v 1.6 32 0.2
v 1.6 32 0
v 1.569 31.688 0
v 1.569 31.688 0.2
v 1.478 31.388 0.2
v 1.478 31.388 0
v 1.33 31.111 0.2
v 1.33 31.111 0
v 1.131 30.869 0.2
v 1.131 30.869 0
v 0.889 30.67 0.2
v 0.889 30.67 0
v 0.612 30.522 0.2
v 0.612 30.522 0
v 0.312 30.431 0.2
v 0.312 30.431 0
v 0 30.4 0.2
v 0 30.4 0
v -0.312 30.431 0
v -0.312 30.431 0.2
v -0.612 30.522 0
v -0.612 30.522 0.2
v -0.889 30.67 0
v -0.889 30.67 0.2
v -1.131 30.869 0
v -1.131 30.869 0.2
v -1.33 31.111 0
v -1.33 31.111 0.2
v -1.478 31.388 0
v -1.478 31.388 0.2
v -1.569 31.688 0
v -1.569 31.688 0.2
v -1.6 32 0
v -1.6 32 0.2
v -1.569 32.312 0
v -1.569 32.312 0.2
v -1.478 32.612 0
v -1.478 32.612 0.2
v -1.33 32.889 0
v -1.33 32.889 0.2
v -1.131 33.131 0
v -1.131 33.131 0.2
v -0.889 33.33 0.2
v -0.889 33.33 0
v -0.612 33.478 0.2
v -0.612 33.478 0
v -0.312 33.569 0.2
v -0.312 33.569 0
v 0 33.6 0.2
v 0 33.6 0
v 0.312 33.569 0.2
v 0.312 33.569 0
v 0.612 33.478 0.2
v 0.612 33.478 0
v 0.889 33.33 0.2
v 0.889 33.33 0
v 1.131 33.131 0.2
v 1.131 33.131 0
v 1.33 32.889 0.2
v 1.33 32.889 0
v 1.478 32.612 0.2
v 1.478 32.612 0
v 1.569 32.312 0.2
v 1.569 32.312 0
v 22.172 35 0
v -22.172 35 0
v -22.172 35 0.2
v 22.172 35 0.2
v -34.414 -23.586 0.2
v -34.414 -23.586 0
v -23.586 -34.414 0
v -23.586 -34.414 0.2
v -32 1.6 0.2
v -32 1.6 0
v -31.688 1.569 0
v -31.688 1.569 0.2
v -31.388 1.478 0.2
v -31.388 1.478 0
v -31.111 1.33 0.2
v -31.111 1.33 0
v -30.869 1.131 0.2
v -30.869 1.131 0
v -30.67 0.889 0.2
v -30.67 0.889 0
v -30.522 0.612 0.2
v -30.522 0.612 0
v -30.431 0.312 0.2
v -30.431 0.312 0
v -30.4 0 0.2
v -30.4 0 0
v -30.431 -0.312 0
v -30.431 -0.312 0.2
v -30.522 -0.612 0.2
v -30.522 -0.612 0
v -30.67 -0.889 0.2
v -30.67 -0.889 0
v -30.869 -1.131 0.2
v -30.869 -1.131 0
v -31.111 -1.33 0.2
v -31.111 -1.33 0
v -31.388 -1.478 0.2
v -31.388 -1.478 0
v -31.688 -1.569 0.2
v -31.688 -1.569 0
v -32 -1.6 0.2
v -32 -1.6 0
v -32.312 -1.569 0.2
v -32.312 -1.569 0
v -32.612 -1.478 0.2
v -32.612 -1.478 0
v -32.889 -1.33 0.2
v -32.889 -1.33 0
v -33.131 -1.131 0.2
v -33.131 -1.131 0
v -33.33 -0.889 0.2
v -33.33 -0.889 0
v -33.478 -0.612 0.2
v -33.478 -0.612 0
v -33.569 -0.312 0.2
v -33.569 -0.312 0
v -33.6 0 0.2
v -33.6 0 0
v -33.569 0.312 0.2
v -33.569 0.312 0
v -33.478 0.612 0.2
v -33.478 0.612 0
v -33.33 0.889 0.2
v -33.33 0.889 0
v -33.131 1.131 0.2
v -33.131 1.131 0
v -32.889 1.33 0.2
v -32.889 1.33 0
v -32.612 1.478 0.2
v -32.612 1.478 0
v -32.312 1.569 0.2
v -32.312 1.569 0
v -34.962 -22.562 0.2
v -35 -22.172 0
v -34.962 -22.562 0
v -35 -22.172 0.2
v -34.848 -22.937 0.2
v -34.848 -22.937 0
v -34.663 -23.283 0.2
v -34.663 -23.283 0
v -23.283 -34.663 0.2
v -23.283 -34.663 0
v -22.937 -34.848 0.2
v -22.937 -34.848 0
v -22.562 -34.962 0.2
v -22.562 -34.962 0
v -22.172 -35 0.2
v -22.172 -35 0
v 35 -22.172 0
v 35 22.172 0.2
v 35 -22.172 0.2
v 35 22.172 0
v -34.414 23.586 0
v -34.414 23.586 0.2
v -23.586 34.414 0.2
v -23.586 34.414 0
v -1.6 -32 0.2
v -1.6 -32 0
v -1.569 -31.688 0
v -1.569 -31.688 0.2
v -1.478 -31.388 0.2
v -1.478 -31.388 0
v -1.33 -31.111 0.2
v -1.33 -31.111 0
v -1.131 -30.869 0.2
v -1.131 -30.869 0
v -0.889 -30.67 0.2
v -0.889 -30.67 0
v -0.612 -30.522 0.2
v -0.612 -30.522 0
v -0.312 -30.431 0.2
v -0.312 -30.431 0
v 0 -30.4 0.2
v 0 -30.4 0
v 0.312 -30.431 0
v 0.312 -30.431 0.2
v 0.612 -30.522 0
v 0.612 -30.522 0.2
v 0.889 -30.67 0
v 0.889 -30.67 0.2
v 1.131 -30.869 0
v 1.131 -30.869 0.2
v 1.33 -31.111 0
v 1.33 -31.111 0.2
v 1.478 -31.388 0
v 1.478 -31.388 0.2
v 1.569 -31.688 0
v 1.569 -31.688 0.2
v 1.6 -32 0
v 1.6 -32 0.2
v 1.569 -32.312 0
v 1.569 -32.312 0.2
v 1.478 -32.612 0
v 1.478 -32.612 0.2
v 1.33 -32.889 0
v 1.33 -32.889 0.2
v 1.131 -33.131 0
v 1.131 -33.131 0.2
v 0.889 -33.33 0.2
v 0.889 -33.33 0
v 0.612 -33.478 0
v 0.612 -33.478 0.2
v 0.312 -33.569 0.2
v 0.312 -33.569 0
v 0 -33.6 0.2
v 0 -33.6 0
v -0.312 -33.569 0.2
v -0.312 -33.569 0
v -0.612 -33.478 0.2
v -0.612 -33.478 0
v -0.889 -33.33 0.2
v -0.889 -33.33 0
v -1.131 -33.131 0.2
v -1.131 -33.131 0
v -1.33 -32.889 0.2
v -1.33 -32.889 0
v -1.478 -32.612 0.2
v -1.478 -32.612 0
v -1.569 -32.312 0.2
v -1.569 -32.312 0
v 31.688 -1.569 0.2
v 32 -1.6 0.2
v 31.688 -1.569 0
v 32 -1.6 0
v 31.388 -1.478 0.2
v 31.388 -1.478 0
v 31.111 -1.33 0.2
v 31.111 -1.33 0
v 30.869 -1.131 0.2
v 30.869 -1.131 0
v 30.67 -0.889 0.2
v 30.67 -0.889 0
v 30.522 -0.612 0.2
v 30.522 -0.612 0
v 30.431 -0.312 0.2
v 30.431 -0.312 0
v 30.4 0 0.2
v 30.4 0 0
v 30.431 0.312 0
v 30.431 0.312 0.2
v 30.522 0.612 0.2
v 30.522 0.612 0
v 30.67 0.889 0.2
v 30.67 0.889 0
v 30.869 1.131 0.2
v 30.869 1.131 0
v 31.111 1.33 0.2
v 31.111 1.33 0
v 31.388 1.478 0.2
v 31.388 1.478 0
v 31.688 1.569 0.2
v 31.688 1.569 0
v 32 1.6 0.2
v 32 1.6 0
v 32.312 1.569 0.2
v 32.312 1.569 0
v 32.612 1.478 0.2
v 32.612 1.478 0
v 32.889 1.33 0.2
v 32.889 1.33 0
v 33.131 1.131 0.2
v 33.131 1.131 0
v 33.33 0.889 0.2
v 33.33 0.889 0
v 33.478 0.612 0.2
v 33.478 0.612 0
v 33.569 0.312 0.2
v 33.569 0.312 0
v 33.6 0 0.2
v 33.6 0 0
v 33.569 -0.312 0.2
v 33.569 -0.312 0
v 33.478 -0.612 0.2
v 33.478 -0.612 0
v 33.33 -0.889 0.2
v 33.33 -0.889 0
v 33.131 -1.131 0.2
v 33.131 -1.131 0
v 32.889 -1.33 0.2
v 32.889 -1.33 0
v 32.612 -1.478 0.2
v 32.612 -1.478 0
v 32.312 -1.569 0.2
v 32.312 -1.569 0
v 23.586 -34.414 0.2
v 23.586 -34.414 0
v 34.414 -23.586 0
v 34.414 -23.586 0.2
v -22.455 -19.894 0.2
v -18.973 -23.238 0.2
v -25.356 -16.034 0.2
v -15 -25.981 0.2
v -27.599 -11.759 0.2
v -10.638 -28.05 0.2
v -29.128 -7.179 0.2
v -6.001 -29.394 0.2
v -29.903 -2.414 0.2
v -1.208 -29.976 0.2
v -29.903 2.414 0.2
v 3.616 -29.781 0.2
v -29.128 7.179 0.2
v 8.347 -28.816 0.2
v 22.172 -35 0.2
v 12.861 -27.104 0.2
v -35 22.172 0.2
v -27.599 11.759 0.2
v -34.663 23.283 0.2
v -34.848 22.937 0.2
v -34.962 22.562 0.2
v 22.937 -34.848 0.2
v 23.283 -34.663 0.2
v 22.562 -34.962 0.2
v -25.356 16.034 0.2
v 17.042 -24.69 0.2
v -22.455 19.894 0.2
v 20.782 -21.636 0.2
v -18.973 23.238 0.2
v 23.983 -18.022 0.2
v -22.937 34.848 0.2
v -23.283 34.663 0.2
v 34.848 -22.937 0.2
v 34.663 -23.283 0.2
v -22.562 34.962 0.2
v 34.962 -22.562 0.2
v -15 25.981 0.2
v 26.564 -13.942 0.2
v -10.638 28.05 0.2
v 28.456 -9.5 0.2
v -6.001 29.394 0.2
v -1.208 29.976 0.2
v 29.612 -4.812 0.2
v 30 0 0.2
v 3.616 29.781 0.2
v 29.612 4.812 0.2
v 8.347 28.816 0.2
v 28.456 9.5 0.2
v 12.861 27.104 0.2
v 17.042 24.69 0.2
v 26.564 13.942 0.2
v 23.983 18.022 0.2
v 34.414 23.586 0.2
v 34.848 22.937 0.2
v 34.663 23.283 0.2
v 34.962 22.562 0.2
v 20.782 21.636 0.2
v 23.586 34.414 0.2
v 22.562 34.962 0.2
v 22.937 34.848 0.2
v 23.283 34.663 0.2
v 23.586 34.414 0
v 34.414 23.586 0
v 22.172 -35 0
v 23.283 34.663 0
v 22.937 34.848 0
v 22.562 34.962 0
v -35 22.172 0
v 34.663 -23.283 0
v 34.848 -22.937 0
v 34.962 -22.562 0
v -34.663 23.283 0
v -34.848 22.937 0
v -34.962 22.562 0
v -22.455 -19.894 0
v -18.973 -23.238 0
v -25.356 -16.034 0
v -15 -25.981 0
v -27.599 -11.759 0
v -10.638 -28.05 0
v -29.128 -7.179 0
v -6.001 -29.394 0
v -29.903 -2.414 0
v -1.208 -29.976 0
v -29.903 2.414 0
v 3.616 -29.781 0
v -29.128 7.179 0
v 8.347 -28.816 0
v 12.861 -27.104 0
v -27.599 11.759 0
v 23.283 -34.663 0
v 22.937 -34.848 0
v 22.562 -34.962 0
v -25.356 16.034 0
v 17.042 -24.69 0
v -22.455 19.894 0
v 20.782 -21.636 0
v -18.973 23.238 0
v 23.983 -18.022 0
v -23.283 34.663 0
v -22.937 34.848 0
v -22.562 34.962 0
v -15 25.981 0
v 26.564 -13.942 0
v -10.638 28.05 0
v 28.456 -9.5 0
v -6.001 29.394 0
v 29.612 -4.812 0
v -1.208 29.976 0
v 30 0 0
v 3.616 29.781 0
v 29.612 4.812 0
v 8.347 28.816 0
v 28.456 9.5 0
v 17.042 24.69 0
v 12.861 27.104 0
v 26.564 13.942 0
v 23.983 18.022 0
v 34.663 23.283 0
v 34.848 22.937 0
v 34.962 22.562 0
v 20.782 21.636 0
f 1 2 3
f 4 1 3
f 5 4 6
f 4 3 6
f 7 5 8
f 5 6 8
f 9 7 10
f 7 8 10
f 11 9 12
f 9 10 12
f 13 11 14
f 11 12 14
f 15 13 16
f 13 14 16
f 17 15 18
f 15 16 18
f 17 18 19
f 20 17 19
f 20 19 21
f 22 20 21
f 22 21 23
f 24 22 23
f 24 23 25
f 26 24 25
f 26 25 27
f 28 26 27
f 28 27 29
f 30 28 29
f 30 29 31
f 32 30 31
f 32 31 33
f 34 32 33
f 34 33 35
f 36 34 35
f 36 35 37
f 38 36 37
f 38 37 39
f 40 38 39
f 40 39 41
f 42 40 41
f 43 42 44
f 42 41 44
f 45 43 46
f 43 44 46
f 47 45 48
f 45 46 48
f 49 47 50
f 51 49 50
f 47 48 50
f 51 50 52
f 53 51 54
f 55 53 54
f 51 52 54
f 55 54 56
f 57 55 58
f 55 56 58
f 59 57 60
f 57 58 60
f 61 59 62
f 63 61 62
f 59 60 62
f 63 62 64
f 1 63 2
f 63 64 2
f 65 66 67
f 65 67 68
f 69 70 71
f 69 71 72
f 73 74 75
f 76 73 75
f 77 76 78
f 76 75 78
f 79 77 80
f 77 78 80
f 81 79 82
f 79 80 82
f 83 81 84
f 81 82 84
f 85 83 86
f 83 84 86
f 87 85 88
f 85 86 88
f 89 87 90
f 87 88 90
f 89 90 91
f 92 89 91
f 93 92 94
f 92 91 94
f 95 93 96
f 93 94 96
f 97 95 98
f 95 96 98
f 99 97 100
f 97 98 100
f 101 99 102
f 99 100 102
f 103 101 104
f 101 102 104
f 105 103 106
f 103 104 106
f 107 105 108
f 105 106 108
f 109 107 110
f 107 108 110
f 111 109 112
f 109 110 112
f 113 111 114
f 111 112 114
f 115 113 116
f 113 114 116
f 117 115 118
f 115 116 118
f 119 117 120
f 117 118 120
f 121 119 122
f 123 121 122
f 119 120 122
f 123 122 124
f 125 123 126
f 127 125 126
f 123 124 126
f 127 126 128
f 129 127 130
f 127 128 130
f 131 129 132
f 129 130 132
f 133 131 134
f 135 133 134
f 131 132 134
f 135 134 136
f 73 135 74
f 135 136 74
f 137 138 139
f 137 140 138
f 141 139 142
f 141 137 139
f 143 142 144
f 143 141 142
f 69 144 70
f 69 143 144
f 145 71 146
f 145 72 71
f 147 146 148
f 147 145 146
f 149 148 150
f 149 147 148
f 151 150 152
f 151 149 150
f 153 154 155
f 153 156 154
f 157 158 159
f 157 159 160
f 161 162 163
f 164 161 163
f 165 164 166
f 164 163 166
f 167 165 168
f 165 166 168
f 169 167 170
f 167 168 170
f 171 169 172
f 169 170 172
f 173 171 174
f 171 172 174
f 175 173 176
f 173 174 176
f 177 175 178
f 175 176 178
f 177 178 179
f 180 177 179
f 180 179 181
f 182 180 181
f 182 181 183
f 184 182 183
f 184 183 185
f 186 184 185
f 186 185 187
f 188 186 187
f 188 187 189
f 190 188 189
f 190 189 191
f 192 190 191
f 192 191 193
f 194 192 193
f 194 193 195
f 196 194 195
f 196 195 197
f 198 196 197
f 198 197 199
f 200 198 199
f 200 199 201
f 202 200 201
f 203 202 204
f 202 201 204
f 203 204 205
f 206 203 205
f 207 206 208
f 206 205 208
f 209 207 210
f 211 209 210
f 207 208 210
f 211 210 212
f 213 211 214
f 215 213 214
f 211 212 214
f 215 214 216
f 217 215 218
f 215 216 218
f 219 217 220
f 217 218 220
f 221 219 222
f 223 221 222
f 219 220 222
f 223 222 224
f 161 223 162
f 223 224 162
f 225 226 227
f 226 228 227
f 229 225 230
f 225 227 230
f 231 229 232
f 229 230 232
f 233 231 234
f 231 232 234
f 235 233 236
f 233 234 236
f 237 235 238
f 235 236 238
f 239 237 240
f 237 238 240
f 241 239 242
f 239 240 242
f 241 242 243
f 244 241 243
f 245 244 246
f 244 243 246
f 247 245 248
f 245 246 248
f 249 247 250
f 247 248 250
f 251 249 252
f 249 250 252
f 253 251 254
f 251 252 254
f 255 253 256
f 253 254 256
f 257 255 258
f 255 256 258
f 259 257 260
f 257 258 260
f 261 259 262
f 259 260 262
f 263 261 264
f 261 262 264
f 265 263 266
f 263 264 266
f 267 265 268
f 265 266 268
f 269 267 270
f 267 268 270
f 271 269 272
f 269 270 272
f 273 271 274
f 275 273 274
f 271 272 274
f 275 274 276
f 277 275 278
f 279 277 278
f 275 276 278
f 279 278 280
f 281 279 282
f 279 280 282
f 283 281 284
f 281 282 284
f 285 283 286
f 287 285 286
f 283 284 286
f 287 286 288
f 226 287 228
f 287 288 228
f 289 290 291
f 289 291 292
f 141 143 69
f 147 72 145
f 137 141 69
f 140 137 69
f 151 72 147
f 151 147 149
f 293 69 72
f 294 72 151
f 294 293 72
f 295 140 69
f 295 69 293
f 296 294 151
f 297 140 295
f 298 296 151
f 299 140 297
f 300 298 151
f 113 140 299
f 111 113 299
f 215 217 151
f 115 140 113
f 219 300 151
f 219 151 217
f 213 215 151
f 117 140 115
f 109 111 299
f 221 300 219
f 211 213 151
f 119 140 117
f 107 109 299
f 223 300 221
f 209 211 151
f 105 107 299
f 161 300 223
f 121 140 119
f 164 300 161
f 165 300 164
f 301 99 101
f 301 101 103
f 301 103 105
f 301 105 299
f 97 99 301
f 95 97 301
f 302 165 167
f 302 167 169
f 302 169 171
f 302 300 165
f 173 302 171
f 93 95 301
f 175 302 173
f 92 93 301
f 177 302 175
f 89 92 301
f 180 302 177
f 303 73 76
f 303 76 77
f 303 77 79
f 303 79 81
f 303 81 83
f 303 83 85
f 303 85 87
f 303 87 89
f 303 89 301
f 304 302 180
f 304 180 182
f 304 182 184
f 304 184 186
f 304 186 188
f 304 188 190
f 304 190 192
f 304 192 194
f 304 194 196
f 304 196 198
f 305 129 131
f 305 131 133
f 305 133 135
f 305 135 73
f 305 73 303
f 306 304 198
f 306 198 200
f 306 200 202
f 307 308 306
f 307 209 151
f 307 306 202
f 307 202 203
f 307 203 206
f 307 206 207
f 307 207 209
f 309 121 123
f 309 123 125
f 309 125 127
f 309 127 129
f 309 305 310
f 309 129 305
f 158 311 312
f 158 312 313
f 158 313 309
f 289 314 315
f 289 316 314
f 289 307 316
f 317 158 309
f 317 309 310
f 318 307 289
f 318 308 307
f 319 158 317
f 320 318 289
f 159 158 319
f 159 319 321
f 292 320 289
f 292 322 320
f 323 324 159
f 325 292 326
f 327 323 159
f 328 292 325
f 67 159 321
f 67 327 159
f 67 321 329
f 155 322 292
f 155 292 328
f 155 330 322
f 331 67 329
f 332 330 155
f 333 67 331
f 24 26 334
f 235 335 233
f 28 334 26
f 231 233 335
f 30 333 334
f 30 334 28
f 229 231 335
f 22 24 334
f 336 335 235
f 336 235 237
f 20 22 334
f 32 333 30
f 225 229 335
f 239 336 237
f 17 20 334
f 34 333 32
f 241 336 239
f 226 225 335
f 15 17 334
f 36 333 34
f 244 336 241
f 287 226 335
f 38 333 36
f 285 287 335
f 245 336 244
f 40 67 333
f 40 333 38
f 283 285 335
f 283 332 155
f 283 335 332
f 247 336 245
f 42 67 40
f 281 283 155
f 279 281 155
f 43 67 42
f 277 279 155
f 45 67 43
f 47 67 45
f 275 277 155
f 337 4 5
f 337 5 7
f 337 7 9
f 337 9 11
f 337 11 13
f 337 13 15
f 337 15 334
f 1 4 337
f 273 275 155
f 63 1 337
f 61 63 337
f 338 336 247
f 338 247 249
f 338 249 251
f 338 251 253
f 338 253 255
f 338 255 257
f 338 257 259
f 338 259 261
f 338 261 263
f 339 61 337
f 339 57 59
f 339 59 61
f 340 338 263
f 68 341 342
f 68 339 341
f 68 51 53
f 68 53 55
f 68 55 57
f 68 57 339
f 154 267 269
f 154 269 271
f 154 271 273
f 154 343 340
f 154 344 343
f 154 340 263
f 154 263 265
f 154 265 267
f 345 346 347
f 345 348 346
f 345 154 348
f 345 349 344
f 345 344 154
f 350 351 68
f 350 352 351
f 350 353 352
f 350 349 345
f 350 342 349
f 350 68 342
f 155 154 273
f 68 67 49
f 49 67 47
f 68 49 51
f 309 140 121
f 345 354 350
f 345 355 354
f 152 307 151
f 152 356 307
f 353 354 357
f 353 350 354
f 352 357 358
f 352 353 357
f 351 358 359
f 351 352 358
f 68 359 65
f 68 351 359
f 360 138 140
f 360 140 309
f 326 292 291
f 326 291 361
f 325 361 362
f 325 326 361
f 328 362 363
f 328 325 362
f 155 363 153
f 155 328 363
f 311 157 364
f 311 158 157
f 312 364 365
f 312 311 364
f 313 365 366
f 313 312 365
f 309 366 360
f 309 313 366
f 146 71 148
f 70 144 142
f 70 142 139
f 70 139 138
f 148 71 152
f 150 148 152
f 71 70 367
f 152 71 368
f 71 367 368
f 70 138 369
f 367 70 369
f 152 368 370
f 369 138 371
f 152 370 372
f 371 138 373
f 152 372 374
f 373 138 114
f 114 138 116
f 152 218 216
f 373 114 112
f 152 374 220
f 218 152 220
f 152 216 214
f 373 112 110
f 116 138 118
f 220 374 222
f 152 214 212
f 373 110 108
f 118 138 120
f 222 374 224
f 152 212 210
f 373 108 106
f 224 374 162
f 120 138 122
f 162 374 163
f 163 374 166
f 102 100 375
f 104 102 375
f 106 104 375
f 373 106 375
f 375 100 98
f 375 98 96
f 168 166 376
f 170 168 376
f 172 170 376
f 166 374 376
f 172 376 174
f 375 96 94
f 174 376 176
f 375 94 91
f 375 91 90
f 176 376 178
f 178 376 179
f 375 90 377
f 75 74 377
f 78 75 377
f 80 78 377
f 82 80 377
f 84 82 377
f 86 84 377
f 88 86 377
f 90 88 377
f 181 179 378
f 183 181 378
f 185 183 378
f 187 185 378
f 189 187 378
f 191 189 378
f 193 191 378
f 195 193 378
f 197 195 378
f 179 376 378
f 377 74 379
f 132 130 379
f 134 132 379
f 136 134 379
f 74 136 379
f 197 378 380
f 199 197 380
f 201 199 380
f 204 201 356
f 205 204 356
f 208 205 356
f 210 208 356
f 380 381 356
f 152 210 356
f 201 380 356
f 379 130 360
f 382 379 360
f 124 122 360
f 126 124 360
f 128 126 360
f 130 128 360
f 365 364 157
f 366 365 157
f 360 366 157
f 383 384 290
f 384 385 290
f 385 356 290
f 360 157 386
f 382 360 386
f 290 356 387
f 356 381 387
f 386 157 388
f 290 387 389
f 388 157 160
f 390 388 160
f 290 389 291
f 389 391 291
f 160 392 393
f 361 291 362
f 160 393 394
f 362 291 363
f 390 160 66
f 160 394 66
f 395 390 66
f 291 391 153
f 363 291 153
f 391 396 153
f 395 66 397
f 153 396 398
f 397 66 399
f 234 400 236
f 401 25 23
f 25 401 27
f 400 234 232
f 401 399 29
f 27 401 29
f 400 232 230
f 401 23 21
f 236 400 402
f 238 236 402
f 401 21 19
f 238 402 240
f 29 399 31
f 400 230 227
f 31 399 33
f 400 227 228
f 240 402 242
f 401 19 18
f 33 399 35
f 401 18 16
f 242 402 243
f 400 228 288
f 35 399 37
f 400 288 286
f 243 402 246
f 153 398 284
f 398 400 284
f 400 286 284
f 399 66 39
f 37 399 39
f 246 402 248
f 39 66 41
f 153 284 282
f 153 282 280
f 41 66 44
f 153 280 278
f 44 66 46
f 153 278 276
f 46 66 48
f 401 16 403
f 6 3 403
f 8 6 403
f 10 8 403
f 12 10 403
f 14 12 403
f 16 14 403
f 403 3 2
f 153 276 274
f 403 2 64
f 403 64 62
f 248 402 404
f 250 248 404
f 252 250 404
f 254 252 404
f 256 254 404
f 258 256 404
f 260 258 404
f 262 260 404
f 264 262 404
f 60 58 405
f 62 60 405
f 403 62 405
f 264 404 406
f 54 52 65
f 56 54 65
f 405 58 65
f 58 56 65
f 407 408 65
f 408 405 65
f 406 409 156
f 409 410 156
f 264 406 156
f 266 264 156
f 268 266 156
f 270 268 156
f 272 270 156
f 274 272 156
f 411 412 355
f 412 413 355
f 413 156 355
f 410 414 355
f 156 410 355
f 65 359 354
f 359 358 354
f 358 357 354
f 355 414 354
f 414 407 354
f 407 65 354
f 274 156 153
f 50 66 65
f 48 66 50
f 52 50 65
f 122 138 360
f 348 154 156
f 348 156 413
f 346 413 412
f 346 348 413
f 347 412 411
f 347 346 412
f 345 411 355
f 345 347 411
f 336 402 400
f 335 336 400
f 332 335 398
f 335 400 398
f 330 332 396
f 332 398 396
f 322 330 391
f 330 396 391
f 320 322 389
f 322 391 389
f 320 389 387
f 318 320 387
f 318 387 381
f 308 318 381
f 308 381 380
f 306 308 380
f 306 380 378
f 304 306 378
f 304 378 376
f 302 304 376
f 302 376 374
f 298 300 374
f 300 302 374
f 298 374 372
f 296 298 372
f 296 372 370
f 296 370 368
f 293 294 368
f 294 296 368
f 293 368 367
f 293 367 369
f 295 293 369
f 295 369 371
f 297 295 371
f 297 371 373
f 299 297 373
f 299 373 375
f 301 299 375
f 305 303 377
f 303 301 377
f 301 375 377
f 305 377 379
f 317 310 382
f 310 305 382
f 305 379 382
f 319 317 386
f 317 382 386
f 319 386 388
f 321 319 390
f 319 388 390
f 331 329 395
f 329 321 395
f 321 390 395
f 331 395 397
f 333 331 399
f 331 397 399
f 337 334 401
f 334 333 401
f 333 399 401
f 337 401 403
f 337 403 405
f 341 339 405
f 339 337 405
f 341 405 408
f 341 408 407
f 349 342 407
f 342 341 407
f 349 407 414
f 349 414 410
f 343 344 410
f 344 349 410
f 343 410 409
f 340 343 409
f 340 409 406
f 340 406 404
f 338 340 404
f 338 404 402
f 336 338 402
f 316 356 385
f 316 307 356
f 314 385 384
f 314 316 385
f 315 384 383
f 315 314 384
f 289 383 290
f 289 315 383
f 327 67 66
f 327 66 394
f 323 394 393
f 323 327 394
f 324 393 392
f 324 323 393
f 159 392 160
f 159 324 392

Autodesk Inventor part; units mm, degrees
ref_plane "YZ Plane" through (0, 0, 0) normal (1, 0, 0) x (0, 1, 0)
ref_plane "XZ Plane" through (0, 0, 0) normal (0, 1, 0) x (-1, 0, 0)
ref_plane "XY Plane" through (0, 0, 0) normal (0, 0, 1) x (1, 0, 0)
sketch "Sketch1" plane through (0, 0, 0) normal (0, 0, 1) x (1, 0, 0)
  line L0 (-35, 35) -> (35, 35)
  line L1 (35, 35) -> (35, -35)
  line L2 (35, -35) -> (-35, -35)
  line L3 (-35, -35) -> (-35, 35)
  circle A0 centre (0, 0) radius 30
  point P0 (35, 0)
  point P1 (0, 35)
  dimension "d0" = 70
  dimension "d1" = 60
extrude "Extrusion1" add sketch "Sketch1" along normal blind 0.2
chamfer "Chamfer1" distance 12 angle 45 4 edges at (35, 35, 0.1) (35, -35, 0.1) (-35, -35, 0.1) (-35, 35, 0.1)
fillet "Fillet1" radius 2 8 edges at (-23, 35, 0.1) (23, 35, 0.1) (35, 23, 0.1) (35, -23, 0.1) (23, -35, 0.1) (-23, -35, 0.1) (-35, -23, 0.1) (-35, 23, 0.1)
sketch "Sketch2" plane through (0, 0, 0.2) normal (0, 0, 1) x (1, 0, 0)
  circle A0 centre (0, 0) radius 32 construction
  point P0 (32, 0)
  dimension "d8" = 64
hole "Hole1" at (32, 0, 0.2) direction (0, 0, -1) diameter 3.2 end through all
pattern_circular "Circular Pattern1" count 4 over 360 about axis through (0, 0, -10) along (0, 0, 1) of "Hole1"
sketch "Sketch3" plane through (0, 0, 0.2) normal (0, 0, 1) x (1, 0, 0)
  circle A0 centre (0, 0) radius 23.75 construction
  point P0 (23.75, 0)
  dimension "d19" = 47.5
properties part number "plasma-box-mica" material "Nylon 6/6"
